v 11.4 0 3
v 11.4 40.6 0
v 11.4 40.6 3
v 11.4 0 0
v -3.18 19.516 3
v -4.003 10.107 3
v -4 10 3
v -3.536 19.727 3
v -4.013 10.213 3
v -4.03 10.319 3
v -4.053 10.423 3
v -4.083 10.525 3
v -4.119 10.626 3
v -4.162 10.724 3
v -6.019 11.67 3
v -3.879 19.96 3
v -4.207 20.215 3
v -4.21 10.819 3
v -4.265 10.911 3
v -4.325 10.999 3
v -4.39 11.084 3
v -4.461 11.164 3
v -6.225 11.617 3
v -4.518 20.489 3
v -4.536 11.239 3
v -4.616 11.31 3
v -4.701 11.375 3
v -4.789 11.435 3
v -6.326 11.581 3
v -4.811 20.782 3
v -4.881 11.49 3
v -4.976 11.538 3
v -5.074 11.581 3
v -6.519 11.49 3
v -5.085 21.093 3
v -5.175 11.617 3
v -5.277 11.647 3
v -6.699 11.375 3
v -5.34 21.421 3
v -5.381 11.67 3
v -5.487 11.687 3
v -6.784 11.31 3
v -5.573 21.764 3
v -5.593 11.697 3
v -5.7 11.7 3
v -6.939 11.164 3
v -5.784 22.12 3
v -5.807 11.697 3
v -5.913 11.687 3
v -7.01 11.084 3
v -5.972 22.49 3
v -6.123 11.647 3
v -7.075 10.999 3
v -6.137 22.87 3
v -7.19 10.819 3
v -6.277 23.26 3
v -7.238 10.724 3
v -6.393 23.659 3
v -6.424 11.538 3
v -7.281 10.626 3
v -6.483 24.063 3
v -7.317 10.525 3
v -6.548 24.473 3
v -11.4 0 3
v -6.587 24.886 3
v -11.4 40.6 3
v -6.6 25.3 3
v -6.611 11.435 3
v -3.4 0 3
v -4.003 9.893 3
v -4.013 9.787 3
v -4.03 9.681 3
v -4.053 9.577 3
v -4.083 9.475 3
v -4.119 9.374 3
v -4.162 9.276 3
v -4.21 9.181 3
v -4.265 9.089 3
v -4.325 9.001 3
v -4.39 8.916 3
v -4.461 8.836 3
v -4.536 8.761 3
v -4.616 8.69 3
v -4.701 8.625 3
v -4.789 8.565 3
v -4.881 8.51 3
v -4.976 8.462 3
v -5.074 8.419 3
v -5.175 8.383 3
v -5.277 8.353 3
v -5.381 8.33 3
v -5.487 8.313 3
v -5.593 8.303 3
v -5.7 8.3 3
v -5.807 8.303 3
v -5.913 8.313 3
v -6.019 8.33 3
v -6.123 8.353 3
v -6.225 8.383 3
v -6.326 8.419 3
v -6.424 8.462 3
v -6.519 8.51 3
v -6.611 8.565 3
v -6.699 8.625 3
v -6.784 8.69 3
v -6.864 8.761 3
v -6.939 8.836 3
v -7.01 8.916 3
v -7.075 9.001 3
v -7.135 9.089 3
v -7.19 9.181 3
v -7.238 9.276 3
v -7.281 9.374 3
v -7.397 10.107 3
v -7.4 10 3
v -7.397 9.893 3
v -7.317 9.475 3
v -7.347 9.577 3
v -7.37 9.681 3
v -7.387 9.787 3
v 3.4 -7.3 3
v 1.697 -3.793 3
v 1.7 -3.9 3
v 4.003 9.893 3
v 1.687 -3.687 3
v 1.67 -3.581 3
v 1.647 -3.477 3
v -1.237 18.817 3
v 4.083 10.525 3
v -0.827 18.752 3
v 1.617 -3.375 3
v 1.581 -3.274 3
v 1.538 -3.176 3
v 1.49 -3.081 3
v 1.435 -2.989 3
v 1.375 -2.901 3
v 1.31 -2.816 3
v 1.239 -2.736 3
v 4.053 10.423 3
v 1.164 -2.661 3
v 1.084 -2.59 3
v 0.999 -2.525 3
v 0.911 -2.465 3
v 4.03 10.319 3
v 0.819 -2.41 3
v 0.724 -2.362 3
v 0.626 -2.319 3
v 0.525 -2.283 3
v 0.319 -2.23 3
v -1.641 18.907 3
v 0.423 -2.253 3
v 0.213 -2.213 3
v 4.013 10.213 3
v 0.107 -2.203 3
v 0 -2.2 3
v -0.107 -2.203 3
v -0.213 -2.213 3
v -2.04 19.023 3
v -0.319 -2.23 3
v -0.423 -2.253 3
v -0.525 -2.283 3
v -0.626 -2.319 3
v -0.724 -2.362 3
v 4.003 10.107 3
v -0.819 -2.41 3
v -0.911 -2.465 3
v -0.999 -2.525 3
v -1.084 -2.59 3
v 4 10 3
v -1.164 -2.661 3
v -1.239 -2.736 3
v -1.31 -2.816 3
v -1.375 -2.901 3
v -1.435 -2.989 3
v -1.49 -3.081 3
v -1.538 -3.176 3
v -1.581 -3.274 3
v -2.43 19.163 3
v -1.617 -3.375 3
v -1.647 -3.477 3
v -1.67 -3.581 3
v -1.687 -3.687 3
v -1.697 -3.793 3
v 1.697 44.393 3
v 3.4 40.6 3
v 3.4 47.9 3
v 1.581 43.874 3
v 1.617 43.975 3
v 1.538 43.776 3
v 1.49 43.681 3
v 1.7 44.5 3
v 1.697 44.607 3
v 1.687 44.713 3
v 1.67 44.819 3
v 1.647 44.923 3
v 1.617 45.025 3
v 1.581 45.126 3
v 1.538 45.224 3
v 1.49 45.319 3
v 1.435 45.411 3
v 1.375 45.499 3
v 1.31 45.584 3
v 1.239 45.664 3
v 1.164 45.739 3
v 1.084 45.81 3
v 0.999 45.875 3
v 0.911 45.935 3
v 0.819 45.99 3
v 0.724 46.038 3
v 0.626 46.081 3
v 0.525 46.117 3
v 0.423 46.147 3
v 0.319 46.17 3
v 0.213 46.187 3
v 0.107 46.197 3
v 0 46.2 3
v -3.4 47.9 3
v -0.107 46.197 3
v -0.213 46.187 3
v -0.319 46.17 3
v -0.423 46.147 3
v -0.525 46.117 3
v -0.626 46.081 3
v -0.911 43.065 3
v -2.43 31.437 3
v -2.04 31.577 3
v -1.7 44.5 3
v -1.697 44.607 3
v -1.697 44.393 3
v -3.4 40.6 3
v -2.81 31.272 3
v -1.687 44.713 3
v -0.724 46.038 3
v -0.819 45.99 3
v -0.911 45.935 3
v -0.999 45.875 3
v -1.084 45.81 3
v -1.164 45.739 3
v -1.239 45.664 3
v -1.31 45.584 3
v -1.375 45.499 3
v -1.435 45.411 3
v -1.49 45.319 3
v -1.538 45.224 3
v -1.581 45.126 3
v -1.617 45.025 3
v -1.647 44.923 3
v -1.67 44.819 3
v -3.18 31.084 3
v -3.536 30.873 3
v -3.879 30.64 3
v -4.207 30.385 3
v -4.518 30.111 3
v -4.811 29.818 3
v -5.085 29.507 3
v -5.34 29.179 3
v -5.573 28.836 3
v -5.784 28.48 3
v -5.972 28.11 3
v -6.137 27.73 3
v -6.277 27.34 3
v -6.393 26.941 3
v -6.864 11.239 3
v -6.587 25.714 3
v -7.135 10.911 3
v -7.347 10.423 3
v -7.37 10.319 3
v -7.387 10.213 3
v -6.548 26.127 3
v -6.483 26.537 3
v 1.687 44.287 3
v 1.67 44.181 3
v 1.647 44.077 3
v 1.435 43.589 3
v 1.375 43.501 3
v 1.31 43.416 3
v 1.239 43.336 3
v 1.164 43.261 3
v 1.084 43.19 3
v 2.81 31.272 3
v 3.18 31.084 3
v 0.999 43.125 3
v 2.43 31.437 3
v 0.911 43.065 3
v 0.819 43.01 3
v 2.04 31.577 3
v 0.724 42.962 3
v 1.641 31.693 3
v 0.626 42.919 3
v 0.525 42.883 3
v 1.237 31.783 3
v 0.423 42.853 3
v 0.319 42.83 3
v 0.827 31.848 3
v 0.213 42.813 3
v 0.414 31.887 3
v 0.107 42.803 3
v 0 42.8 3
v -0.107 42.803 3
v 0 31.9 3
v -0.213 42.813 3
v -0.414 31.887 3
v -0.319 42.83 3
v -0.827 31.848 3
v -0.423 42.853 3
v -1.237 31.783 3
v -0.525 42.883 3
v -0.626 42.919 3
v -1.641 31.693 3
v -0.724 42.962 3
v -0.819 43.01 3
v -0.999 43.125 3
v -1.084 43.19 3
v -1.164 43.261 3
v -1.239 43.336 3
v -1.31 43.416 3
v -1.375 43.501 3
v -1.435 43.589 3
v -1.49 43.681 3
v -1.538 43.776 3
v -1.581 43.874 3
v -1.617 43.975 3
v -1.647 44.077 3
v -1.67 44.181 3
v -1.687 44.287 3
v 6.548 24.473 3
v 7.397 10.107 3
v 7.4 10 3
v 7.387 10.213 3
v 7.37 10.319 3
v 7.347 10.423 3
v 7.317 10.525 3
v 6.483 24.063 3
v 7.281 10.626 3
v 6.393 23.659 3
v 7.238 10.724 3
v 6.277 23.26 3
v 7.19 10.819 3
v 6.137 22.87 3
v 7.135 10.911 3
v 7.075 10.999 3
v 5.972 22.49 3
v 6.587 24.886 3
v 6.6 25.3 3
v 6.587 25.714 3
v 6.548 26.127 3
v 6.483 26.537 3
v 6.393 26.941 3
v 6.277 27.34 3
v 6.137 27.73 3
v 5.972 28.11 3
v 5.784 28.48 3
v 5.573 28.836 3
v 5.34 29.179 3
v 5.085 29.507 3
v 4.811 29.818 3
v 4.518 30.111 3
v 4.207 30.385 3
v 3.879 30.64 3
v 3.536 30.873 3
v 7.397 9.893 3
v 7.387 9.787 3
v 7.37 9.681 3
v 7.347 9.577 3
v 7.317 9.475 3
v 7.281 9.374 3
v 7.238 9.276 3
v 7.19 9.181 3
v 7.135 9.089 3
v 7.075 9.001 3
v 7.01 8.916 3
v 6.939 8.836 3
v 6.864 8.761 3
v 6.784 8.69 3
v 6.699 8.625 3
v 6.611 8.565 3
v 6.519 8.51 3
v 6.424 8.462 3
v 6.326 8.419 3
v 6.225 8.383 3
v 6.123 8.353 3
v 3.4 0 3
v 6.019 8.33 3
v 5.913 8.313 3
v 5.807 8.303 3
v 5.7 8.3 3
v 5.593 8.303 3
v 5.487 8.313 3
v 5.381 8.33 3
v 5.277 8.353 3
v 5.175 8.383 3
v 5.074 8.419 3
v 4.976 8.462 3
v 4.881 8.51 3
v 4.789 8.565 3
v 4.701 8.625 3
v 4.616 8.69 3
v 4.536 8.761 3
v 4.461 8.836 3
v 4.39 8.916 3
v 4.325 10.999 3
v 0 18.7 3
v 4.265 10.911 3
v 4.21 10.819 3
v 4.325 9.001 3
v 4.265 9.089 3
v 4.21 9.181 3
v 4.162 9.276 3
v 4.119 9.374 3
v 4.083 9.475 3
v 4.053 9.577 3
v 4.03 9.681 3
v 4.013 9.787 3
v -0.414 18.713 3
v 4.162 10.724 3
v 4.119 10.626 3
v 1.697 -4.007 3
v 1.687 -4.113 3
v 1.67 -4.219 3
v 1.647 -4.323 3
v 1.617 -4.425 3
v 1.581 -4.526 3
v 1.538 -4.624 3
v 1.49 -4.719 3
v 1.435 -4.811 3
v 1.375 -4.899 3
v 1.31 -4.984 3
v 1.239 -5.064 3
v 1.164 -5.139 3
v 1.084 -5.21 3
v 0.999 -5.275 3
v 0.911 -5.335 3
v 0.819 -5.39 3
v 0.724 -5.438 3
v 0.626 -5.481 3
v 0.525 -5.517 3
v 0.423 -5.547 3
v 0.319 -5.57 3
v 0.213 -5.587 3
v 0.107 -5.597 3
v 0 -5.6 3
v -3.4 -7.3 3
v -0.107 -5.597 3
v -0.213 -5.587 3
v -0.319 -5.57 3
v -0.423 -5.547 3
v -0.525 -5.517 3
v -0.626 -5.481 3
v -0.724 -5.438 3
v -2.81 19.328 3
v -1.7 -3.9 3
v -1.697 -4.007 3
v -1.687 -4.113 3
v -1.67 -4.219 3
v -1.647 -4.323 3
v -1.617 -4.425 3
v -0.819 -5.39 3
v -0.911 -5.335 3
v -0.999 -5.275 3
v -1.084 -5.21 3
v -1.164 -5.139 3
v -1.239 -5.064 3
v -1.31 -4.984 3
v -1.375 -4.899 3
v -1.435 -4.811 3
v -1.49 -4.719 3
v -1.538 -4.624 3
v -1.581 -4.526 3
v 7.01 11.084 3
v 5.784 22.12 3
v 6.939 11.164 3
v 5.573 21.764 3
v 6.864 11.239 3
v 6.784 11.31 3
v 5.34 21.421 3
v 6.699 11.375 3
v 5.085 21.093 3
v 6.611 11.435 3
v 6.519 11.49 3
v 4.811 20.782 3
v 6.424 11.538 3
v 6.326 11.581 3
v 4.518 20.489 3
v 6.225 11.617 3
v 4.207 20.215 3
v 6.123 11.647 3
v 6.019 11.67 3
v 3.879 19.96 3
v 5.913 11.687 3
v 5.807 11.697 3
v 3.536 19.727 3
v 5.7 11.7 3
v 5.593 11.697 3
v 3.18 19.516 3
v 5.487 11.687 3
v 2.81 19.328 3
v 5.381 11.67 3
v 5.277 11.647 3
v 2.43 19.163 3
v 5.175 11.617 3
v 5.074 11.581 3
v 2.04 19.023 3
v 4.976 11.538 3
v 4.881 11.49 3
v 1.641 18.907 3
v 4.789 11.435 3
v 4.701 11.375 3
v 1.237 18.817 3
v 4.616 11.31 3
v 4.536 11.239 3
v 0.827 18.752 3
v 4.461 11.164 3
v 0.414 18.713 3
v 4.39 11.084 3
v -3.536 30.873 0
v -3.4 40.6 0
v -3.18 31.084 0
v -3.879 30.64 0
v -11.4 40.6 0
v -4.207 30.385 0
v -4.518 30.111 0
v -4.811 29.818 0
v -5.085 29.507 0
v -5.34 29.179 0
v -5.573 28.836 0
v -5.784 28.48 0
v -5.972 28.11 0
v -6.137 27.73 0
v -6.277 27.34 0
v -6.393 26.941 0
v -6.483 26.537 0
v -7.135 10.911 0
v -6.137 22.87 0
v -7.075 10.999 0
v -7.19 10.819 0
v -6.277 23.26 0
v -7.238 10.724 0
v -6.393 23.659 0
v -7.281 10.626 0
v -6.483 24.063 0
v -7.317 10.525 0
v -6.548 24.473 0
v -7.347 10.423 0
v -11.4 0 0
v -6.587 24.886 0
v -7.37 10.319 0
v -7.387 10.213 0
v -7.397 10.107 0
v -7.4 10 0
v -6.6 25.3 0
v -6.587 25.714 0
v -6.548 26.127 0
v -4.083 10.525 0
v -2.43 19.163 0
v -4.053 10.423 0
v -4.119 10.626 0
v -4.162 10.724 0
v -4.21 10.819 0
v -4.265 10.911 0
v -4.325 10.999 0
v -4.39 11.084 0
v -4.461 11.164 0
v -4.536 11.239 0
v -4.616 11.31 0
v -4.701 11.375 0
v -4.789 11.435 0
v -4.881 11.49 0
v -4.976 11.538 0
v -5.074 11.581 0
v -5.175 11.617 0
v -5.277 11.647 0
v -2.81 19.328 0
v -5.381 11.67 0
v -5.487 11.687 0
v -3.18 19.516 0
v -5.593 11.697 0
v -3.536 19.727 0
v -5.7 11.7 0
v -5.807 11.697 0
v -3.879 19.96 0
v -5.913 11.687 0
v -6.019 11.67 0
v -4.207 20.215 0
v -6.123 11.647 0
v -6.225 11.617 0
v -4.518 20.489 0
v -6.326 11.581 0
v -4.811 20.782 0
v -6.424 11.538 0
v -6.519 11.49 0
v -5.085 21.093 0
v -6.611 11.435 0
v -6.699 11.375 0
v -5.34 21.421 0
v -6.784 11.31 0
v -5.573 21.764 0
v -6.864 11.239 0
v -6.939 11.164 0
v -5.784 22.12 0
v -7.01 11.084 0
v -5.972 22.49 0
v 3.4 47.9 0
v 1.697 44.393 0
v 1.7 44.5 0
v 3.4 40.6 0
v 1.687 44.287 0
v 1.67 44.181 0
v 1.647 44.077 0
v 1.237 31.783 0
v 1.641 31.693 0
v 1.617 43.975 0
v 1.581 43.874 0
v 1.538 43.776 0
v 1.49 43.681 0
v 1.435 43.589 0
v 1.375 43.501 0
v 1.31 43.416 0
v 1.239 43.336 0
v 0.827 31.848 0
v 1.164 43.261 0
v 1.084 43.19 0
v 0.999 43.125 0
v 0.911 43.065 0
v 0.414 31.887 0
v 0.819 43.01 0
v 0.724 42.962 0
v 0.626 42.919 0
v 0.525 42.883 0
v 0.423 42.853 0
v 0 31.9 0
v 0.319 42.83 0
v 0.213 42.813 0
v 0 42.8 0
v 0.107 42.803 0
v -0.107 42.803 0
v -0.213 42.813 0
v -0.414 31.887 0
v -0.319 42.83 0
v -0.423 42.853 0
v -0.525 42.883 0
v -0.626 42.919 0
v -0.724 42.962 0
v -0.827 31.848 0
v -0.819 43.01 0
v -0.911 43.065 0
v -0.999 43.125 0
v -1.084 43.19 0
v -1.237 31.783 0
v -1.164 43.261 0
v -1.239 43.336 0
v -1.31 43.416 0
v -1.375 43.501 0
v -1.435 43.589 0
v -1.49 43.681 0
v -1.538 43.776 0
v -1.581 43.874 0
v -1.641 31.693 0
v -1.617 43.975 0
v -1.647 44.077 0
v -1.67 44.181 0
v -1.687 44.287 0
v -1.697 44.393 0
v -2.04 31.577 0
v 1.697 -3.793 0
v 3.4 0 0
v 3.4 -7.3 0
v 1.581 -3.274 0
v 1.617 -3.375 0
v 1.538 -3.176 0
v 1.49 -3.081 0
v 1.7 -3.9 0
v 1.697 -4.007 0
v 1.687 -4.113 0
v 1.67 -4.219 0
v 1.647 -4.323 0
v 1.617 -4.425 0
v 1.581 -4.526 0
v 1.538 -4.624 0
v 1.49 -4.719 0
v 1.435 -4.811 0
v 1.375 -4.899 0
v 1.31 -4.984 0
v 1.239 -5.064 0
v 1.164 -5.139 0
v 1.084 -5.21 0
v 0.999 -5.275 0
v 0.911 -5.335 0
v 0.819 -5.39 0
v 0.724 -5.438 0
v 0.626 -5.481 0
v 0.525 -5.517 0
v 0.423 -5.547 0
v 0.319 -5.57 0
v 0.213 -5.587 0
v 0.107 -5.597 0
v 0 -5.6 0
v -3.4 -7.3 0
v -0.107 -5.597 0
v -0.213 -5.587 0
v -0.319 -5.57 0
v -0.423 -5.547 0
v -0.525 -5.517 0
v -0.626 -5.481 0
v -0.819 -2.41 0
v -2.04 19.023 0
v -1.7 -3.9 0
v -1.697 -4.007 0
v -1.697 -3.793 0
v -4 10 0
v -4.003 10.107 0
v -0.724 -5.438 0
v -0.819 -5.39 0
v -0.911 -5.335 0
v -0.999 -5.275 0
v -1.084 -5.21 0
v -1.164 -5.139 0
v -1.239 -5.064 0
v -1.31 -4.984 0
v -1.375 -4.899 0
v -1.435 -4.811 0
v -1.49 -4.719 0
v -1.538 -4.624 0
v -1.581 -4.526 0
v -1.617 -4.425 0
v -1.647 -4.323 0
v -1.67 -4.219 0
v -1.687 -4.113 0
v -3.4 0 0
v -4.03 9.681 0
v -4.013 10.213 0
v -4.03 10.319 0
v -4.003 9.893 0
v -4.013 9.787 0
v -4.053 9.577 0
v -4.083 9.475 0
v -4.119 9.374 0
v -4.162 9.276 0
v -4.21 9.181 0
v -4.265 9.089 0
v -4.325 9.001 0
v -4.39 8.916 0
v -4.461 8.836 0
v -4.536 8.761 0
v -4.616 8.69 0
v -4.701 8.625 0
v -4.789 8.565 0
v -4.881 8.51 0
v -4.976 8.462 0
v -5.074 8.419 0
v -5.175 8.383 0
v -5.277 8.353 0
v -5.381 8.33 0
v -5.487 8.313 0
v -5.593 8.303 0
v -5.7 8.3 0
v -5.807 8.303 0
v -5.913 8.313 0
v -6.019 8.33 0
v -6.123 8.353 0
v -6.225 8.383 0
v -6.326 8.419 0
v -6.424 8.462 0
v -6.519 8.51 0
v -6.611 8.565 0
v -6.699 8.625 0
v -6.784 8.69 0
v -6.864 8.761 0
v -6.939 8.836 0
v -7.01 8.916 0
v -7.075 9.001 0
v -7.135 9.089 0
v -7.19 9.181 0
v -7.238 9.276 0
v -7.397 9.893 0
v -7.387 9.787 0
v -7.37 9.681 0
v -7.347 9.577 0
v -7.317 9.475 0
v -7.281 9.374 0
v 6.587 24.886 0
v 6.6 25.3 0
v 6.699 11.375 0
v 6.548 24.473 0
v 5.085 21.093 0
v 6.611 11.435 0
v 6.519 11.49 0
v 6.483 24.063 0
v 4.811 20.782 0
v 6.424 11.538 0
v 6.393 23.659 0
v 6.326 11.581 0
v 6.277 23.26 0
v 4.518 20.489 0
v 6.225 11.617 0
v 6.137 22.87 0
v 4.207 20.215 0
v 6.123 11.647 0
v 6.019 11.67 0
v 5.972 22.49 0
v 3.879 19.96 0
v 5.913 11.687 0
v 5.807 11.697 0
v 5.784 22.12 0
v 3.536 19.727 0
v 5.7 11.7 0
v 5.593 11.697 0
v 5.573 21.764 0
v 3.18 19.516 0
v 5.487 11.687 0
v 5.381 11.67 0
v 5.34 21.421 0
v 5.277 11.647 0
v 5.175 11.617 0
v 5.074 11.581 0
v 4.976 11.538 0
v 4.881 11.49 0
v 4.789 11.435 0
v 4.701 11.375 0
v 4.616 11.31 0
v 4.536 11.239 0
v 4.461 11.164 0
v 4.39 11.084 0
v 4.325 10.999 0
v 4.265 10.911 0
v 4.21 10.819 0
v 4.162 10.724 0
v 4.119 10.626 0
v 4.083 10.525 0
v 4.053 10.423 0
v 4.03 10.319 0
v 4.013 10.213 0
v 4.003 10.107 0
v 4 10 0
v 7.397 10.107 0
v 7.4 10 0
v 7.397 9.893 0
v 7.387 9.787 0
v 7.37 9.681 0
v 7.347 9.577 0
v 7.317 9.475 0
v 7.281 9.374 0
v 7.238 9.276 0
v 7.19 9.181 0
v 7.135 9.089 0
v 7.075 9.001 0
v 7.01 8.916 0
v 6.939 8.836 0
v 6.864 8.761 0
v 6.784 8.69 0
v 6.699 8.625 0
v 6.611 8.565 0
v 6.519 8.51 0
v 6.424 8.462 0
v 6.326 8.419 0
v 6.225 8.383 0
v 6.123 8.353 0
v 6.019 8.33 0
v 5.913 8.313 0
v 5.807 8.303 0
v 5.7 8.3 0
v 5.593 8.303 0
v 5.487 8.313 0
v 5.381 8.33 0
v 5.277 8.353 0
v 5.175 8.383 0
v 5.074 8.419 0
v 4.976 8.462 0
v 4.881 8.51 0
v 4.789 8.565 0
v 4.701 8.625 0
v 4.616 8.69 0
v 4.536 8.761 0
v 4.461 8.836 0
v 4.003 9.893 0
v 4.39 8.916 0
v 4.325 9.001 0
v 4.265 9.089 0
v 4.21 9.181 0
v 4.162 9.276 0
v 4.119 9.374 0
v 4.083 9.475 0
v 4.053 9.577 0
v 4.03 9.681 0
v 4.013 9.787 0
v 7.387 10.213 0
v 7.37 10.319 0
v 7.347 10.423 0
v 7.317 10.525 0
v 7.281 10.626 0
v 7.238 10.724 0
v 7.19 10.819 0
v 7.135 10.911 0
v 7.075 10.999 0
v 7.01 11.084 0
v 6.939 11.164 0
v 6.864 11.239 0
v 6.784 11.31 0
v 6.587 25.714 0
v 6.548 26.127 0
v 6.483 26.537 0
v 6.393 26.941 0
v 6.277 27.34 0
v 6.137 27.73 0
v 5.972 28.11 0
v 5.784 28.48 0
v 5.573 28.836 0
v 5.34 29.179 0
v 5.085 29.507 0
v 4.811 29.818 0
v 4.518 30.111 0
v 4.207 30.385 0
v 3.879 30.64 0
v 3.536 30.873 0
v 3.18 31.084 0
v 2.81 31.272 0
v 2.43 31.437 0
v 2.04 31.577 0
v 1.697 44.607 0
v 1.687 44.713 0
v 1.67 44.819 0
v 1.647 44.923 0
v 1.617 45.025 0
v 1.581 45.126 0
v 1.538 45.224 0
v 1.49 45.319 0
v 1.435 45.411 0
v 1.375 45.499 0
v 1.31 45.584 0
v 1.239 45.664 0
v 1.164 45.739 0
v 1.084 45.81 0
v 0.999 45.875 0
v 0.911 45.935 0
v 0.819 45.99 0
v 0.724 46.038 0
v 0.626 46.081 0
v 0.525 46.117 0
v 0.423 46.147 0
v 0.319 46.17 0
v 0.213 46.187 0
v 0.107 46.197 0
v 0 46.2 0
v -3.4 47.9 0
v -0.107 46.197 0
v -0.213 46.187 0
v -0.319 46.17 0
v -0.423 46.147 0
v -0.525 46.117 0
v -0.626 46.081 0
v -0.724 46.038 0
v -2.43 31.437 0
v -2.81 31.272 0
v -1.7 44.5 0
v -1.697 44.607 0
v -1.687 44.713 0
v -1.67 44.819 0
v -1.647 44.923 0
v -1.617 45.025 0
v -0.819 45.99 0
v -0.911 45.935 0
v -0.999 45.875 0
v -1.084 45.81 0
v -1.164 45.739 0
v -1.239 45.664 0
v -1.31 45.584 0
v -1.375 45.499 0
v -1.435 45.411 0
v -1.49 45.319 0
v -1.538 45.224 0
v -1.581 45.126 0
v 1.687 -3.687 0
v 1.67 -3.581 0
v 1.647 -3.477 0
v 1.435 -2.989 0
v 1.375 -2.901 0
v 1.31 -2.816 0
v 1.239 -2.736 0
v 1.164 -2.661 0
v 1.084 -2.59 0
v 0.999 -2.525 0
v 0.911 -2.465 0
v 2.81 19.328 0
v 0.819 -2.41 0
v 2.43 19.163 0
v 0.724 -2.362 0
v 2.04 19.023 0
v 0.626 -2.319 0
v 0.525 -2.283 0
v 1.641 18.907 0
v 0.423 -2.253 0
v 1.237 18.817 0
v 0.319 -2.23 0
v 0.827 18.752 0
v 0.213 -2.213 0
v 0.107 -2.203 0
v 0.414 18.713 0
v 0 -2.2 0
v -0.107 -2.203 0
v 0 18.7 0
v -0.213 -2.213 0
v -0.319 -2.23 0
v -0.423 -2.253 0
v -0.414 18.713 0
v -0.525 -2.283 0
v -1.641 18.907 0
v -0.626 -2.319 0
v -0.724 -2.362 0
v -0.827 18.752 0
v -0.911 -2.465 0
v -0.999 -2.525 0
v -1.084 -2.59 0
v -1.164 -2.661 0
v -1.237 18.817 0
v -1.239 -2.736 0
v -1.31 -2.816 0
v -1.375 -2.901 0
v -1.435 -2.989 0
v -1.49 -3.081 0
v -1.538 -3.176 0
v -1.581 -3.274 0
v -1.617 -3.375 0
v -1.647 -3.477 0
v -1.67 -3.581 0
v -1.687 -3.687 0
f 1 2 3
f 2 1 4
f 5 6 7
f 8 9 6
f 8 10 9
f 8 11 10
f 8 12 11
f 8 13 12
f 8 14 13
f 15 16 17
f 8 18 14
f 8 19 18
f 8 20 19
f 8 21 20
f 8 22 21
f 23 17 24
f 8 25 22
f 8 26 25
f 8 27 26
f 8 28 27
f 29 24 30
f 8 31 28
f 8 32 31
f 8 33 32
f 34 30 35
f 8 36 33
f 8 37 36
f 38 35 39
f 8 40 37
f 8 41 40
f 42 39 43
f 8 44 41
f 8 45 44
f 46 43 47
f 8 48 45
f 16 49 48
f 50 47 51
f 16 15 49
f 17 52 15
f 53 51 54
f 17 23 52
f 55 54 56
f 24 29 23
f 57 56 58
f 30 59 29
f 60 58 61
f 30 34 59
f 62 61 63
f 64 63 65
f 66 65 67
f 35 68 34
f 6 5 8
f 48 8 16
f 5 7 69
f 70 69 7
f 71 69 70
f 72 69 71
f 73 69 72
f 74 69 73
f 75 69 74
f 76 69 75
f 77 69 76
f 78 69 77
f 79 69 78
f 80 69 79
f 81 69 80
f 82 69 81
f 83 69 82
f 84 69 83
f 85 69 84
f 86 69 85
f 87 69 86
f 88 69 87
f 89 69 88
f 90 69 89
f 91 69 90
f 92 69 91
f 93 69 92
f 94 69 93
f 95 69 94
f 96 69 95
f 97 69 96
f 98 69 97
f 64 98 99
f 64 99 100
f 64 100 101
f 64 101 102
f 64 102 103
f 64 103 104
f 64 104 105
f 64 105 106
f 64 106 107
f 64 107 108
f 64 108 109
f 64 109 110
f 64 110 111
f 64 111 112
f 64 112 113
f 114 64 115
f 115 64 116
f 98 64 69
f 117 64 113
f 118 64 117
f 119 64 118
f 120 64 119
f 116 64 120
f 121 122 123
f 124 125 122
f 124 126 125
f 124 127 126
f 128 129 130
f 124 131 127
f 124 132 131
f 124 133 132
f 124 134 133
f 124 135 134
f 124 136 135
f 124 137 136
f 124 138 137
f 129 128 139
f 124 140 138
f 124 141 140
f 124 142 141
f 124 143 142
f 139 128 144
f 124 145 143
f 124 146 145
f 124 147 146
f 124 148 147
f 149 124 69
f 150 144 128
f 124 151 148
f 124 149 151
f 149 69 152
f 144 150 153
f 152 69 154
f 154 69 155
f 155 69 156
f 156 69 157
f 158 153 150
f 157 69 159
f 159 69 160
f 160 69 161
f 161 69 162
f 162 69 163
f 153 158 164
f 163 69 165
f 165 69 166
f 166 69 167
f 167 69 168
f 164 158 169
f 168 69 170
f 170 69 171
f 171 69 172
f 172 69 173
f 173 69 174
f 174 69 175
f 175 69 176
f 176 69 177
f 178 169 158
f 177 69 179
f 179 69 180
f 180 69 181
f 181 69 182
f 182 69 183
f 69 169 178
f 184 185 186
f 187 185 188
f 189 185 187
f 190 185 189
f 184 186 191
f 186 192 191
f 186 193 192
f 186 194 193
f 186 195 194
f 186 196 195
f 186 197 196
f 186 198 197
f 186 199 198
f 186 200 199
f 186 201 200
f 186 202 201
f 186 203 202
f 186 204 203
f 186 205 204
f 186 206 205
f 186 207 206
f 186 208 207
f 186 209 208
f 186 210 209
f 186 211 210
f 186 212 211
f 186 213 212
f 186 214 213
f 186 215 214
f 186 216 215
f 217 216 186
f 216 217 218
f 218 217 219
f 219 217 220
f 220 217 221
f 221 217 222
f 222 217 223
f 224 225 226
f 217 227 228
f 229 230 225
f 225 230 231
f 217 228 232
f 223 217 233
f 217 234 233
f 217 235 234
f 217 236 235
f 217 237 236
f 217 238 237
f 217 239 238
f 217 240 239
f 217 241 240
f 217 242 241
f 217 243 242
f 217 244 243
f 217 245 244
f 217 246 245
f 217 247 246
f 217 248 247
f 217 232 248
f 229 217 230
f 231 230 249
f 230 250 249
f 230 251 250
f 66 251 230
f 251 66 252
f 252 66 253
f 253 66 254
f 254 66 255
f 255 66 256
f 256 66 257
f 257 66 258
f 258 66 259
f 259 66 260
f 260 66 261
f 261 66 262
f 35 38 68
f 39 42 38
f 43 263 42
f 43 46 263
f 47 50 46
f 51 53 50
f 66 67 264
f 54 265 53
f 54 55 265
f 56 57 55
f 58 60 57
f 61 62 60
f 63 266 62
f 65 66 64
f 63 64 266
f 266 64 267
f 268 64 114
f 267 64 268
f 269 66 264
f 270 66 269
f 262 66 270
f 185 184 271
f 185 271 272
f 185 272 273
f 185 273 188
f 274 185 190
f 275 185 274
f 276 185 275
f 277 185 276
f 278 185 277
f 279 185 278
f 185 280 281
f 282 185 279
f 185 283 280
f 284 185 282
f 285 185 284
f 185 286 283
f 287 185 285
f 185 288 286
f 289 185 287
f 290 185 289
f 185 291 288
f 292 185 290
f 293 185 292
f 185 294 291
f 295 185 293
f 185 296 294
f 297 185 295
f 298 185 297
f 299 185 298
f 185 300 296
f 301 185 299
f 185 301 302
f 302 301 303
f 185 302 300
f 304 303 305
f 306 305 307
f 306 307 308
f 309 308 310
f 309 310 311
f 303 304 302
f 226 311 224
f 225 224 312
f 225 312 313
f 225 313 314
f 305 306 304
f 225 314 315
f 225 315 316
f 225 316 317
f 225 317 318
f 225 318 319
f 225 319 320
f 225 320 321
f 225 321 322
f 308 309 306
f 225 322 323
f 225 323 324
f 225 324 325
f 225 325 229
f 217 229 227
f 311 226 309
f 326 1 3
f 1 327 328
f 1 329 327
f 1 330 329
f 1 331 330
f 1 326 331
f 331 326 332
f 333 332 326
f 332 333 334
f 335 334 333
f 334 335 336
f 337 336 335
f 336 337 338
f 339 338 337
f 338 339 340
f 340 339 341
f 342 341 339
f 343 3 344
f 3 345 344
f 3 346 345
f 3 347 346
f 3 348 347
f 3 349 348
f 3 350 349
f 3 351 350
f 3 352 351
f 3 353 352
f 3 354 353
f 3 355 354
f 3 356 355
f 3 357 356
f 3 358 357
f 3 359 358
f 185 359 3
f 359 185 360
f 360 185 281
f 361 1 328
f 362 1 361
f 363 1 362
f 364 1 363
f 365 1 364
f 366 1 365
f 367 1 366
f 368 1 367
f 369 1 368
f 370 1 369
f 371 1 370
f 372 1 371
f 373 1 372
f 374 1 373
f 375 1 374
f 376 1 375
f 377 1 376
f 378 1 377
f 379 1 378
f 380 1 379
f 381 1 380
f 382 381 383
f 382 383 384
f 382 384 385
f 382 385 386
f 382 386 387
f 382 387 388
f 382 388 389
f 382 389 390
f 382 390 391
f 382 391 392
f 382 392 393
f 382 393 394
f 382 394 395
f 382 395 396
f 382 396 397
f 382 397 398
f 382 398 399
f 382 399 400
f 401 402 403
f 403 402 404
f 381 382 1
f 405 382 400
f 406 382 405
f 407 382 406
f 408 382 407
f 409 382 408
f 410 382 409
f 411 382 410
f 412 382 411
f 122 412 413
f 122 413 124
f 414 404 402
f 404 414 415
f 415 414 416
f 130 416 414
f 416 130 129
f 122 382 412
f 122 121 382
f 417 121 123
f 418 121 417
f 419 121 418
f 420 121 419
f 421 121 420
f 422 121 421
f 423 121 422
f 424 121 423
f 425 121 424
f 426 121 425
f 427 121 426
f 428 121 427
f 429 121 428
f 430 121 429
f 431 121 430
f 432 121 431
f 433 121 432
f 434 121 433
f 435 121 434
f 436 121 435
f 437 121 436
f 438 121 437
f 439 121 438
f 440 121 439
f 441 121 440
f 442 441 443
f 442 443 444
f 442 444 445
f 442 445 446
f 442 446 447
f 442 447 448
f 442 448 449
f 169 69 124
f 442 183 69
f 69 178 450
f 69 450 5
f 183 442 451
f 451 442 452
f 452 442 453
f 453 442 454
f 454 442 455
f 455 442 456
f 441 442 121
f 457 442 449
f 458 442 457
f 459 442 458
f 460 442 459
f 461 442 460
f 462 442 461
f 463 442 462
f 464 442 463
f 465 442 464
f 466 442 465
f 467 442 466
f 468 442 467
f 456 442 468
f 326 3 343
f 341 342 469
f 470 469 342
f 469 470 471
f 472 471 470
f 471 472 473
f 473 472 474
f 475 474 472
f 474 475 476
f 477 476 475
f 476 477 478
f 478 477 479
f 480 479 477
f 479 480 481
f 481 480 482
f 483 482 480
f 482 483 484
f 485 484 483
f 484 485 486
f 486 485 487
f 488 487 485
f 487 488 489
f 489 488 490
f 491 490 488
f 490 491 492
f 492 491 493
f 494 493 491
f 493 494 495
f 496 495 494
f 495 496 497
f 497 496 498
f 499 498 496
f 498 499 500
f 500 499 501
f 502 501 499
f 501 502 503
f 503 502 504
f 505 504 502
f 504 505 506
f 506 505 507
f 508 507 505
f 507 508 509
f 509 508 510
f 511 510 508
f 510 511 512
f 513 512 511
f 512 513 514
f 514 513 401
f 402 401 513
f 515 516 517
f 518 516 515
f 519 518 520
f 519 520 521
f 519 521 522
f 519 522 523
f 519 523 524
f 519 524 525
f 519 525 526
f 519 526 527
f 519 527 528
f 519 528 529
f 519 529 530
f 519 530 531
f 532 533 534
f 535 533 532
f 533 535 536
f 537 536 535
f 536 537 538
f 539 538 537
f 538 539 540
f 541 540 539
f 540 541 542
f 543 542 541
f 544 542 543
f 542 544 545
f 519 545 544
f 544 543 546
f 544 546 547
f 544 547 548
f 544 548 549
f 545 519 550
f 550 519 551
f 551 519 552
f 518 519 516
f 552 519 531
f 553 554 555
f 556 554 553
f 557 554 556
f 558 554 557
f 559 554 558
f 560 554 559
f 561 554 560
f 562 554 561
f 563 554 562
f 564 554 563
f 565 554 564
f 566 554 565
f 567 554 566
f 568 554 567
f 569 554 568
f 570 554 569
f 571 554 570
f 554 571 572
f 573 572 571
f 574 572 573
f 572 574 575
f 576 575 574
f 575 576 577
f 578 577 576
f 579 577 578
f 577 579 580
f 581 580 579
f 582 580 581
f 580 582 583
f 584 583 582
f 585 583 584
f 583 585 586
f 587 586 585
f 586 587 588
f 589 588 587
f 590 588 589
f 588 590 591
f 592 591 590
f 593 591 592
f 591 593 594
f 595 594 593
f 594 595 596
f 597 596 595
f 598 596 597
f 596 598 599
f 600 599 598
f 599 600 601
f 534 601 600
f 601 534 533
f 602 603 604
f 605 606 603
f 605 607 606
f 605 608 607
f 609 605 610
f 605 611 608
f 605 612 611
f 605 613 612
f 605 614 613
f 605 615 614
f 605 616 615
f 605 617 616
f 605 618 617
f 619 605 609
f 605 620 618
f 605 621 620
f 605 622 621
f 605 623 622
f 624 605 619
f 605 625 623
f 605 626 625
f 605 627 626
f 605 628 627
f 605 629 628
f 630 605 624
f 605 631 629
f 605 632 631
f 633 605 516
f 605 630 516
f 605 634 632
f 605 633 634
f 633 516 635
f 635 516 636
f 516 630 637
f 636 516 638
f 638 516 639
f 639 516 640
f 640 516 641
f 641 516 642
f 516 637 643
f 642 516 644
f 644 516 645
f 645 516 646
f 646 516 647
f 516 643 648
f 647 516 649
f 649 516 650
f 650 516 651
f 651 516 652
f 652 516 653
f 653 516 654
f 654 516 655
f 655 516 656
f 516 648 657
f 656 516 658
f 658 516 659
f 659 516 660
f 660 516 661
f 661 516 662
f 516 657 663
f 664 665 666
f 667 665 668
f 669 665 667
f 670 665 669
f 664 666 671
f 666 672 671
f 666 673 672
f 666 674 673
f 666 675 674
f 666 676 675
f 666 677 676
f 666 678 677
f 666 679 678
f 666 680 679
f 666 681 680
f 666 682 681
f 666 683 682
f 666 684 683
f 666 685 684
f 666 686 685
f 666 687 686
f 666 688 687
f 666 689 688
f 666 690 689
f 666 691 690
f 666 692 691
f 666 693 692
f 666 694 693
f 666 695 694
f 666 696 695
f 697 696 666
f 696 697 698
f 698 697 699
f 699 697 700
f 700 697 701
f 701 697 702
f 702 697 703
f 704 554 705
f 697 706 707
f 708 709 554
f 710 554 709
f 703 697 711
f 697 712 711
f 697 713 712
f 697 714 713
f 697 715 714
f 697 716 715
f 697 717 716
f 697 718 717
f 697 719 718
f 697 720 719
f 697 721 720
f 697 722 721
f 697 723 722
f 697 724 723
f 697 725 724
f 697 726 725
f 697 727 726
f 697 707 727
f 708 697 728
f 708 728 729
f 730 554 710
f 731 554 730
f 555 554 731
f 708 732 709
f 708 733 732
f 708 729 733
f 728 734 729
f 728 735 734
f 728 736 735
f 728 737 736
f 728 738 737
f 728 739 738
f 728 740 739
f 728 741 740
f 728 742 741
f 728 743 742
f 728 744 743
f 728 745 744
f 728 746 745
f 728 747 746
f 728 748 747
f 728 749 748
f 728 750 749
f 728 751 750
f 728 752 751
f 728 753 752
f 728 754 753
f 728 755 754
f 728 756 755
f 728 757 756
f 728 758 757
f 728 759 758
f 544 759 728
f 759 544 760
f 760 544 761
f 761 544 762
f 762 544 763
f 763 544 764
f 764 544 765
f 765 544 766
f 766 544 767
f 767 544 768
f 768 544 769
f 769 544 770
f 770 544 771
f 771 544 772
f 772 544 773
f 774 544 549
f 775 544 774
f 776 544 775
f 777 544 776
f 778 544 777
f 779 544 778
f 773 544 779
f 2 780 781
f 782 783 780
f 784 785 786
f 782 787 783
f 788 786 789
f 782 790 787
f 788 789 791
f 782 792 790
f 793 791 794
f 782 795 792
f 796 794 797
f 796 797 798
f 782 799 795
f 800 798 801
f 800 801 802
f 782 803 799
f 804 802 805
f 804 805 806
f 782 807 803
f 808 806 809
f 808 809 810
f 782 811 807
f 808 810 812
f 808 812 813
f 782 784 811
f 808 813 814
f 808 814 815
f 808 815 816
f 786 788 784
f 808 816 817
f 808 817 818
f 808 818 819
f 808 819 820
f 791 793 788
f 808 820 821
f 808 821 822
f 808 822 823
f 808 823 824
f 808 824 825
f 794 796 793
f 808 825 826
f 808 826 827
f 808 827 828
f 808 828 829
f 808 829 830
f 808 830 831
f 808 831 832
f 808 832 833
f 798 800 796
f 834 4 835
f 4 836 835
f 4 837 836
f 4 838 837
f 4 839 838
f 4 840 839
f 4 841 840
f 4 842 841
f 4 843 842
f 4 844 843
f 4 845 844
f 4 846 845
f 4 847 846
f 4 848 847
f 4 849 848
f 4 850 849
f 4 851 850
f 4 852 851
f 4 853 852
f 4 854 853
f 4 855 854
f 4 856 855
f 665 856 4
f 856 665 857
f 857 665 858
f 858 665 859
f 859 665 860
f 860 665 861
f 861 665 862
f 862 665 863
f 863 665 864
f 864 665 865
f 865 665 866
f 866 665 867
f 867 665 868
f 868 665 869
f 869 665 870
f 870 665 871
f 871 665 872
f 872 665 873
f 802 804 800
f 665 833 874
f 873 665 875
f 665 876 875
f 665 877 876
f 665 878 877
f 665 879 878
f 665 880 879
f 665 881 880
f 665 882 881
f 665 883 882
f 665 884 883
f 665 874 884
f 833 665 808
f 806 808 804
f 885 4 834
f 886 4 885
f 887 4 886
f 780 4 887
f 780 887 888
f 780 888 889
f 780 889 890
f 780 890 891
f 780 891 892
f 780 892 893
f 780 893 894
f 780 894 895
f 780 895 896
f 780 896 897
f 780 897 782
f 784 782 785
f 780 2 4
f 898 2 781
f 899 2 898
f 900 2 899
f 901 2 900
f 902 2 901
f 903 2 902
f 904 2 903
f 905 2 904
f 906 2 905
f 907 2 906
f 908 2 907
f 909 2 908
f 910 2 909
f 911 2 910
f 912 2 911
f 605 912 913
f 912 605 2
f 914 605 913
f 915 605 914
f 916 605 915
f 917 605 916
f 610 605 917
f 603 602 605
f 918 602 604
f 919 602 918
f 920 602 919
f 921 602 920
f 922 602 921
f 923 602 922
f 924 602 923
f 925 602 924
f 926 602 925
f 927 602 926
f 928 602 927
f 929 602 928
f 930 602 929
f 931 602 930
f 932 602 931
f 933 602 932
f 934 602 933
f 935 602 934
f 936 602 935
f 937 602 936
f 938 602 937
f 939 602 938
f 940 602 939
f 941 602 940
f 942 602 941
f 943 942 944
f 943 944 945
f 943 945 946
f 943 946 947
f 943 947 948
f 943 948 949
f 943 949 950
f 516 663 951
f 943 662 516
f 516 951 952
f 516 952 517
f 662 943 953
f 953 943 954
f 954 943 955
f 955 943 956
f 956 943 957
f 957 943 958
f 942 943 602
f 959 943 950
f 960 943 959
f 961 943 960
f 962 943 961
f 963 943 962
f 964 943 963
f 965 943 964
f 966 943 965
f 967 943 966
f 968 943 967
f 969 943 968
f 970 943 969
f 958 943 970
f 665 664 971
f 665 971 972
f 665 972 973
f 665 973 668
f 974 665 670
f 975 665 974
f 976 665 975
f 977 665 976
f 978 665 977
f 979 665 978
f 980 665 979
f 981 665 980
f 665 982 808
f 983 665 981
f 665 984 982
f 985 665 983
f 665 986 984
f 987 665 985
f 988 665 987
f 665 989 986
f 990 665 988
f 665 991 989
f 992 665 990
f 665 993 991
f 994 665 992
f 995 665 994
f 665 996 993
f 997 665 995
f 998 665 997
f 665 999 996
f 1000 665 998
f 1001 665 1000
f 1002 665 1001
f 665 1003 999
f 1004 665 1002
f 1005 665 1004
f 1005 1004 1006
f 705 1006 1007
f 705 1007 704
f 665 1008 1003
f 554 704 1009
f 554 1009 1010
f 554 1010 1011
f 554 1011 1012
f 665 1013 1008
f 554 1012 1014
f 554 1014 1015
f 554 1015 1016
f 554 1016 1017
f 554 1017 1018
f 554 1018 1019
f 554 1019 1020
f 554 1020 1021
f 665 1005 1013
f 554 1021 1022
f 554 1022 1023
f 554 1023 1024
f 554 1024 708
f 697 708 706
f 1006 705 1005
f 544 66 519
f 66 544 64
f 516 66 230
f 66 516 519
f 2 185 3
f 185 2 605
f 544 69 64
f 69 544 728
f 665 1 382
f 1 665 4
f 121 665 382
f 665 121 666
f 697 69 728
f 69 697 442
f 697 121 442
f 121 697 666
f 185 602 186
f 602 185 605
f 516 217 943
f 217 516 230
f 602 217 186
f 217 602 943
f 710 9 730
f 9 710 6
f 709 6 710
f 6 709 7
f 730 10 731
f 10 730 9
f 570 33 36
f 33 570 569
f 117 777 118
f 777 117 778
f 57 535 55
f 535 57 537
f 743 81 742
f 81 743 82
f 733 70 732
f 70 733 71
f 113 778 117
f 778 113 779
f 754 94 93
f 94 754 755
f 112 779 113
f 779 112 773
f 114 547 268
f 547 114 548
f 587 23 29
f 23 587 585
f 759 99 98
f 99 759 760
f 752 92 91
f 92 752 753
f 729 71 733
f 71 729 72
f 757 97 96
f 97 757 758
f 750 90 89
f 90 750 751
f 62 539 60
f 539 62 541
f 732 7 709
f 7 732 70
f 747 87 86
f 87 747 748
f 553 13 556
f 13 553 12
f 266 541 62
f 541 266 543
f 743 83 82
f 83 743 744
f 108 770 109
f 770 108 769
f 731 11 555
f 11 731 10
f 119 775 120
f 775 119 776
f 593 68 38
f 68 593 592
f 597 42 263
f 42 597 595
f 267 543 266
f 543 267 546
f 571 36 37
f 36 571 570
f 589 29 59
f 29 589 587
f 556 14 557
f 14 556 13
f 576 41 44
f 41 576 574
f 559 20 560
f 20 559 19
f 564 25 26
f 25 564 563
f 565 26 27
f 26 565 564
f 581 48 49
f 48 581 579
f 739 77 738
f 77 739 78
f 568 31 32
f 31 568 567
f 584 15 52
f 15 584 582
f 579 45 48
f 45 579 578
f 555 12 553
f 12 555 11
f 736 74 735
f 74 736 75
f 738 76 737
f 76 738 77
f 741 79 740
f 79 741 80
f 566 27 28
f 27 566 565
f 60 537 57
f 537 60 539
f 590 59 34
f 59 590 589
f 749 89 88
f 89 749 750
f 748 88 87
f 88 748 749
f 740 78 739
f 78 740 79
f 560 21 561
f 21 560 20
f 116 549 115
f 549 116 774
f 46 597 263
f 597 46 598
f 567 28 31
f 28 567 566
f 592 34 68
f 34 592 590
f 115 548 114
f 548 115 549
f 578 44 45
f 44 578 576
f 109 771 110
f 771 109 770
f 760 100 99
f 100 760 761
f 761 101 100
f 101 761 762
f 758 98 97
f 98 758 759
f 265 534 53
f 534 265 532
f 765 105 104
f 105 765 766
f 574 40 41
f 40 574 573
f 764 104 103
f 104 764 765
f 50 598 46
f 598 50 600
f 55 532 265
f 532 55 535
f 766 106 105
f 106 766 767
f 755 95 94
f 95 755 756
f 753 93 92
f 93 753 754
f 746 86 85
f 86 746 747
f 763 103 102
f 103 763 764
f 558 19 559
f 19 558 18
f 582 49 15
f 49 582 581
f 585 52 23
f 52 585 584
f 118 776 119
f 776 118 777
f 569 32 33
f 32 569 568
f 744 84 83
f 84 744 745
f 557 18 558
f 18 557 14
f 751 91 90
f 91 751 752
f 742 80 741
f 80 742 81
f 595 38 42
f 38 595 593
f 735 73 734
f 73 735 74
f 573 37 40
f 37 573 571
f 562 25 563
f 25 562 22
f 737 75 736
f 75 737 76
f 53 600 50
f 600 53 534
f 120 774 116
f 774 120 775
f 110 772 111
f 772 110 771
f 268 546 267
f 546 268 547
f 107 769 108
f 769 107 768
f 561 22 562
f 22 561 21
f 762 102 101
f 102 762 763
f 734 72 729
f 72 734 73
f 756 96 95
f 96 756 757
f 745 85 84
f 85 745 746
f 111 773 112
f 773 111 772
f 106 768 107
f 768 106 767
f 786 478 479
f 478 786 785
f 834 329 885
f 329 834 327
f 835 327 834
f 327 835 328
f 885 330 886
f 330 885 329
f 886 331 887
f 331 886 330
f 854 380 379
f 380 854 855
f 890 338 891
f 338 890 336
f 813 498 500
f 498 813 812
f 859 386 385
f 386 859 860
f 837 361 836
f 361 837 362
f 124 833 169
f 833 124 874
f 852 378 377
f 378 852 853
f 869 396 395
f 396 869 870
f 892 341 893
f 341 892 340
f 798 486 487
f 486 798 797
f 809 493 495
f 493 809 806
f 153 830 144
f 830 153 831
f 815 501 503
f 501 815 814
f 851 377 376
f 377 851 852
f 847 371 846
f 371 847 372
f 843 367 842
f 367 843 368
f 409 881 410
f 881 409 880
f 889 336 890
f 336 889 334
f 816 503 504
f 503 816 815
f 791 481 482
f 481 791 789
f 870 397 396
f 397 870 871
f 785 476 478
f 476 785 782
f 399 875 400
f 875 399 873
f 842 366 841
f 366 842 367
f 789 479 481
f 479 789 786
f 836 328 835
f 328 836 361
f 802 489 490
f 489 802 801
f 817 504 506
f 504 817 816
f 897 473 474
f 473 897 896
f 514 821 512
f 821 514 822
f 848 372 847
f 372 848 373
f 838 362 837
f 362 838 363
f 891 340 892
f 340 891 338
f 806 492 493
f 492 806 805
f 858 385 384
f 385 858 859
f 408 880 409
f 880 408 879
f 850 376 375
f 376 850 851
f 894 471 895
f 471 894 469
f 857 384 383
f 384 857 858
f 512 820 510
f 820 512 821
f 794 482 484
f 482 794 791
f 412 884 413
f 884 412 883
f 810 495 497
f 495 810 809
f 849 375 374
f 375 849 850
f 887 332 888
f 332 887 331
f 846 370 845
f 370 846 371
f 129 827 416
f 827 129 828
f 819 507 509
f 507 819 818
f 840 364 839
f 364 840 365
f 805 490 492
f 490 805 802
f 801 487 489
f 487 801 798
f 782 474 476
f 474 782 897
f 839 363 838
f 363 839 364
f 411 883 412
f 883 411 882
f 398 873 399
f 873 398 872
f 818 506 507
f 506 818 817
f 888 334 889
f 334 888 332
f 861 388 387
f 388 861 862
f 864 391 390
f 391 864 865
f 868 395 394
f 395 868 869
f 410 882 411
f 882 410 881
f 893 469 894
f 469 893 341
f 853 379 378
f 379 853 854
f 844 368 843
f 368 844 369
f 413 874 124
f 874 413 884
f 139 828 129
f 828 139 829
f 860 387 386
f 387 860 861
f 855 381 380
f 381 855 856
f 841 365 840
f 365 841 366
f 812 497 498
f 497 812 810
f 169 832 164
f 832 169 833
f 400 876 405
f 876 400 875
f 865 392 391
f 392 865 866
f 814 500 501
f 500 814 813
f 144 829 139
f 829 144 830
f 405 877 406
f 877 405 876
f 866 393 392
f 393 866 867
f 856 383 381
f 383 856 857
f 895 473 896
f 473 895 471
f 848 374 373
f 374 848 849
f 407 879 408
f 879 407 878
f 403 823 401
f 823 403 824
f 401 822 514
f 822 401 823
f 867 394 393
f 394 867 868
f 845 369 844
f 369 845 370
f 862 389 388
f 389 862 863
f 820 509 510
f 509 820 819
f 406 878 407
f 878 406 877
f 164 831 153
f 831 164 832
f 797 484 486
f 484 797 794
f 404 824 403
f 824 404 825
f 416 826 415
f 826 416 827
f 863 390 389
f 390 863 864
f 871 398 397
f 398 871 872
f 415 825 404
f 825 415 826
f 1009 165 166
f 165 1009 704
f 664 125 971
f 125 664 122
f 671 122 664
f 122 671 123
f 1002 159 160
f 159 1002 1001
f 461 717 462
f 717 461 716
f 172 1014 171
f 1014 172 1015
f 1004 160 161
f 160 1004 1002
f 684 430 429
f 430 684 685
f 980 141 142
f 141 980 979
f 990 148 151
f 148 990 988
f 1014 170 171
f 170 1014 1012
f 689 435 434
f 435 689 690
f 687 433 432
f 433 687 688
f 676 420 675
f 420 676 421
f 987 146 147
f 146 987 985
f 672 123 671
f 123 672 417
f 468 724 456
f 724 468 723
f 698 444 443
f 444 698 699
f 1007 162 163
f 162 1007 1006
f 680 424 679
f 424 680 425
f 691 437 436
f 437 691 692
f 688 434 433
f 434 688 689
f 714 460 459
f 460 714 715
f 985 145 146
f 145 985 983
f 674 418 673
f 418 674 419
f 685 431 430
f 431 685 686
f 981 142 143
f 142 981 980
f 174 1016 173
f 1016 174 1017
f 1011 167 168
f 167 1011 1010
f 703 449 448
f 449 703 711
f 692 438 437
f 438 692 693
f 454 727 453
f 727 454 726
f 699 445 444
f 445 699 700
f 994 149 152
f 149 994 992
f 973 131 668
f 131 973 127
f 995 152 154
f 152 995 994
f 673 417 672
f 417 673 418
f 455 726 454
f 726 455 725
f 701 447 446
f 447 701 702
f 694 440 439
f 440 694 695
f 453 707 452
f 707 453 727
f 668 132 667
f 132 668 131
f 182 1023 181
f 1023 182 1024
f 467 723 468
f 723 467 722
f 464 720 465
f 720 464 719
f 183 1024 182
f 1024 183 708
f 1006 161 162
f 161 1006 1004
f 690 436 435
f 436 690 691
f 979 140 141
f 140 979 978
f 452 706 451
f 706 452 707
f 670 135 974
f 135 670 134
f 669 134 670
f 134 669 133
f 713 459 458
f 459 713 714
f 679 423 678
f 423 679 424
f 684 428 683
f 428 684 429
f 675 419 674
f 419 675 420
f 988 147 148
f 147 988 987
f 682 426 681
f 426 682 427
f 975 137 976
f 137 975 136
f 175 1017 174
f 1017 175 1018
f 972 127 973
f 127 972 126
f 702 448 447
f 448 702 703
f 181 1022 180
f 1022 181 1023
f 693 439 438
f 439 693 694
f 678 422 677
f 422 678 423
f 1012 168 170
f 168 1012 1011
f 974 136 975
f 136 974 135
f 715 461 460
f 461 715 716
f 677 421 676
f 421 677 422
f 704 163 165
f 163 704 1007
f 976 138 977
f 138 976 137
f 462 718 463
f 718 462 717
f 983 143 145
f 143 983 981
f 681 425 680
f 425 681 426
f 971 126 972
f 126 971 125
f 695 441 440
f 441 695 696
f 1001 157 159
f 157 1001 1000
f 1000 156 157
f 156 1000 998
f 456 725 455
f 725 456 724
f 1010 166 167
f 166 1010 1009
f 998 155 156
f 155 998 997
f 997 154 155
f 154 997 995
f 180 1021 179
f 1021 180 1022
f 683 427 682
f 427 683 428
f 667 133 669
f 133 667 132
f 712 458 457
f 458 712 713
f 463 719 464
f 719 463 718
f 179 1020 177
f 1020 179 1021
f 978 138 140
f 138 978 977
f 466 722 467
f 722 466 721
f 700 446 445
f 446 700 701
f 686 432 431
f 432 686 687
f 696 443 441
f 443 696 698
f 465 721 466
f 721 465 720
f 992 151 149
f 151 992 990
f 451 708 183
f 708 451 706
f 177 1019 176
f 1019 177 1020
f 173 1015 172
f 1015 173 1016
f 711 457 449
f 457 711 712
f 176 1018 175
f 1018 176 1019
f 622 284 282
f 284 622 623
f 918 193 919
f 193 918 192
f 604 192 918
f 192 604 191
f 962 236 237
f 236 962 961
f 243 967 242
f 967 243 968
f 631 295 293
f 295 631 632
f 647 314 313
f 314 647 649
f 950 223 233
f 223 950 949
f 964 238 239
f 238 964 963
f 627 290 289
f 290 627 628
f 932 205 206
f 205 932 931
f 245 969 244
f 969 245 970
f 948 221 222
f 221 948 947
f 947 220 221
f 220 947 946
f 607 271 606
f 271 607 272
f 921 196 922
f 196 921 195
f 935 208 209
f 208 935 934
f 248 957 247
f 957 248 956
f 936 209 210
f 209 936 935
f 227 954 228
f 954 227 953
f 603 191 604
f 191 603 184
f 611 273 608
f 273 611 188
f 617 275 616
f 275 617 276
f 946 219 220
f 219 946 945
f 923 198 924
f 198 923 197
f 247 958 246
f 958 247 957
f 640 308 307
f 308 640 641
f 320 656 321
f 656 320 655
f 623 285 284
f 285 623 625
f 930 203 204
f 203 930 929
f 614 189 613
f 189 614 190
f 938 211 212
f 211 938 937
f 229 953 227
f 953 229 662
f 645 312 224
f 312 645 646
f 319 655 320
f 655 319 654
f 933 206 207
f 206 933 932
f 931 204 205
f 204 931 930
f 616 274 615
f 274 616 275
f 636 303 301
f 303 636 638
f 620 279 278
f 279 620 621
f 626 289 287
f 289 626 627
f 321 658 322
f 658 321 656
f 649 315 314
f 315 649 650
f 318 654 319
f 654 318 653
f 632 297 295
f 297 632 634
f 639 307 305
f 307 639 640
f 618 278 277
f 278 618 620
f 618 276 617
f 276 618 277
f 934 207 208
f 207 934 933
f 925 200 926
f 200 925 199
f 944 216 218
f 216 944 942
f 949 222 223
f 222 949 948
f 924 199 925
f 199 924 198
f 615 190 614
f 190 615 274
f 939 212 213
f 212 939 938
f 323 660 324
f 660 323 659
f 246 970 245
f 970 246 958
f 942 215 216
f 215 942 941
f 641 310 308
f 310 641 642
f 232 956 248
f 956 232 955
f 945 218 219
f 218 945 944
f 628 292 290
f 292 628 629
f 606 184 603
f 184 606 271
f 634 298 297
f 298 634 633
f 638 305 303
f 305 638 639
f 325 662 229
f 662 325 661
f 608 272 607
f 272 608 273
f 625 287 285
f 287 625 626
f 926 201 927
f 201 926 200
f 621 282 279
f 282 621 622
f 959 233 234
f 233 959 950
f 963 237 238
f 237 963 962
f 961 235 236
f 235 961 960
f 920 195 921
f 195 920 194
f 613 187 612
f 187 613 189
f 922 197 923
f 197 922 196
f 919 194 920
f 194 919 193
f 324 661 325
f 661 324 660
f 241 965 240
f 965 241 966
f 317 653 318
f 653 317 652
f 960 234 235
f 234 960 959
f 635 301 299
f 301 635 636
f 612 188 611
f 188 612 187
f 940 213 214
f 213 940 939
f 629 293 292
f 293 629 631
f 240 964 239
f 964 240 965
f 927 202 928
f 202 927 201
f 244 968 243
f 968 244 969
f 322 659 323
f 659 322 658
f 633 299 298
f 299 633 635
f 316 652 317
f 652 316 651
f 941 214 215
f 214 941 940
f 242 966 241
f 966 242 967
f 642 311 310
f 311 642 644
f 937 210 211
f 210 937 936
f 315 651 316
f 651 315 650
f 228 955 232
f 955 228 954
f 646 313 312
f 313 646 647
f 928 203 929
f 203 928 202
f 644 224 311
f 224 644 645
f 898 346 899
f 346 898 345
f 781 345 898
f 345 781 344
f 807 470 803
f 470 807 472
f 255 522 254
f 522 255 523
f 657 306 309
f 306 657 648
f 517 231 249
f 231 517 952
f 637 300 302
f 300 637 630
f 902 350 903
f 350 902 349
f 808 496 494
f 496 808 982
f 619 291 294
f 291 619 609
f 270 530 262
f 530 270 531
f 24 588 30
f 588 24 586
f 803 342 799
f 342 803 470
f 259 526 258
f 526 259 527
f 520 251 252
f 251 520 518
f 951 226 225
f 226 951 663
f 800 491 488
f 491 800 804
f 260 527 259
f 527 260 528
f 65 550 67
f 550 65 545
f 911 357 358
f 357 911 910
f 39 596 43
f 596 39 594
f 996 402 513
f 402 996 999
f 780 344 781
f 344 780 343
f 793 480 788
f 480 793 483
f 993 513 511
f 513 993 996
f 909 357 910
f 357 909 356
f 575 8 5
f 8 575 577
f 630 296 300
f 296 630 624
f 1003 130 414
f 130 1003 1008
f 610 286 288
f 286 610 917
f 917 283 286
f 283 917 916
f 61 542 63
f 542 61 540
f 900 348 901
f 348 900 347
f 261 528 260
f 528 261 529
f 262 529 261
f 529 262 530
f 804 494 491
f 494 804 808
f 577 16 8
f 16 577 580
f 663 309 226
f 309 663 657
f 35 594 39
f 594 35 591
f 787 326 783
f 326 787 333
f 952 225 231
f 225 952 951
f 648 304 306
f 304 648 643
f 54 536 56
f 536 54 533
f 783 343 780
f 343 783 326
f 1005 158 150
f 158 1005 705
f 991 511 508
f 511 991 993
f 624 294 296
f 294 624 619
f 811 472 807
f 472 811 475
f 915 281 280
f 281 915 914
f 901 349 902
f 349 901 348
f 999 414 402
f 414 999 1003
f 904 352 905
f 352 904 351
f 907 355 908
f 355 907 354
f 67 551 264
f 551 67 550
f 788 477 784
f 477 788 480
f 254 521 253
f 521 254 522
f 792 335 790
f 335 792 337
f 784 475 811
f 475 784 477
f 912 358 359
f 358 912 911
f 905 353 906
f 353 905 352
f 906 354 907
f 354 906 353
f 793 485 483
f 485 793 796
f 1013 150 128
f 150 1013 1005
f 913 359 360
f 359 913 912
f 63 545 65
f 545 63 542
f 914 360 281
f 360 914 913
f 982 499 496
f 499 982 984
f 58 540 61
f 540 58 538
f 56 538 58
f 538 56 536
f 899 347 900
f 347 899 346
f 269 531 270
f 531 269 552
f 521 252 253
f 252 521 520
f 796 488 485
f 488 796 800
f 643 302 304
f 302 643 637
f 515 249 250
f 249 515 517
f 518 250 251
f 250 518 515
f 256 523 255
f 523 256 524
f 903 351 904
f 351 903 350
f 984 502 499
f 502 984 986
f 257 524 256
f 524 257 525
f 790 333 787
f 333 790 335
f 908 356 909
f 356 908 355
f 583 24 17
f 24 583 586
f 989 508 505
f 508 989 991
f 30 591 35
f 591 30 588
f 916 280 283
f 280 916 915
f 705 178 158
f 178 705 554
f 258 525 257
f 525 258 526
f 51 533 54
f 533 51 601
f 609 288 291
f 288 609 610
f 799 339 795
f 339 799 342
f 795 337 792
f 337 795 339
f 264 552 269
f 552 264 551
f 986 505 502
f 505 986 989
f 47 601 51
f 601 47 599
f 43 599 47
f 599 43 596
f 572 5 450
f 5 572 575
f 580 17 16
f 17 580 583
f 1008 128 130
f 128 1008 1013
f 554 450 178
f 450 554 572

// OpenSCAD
m3s_d = 3.4;
m3s_dh = 6;
m3s_hh = 2;

m3_nuts_width = 5.7;
m3_nuts_height = 6.4;


thickness = 3;

join_hole_distance = m3_nuts_width * 2;
border_clearance = m3_nuts_height;

width = m3_nuts_width * 4;

arm_join_height = 10;

spacing = 40.6;

support_hole_distance = 3.9;


difference() {
  
  union() {
  
    translate([-m3_nuts_width*2,0,0])
    cube([width, spacing, thickness]);

    translate([-m3s_d,-(m3s_d + support_hole_distance),0])    
    cube([m3s_d*2, m3s_d + support_hole_distance,thickness]);
    
    translate([-m3s_d,spacing,0])    
    cube([m3s_d*2, m3s_d + support_hole_distance,thickness]);
  }
  
  // Arm join holes
  union () {

    translate([-m3_nuts_width, arm_join_height, 0])     
    cylinder(d=m3s_d, h=thickness, $fn=100);

    translate([m3_nuts_width, arm_join_height, 0])
    cylinder(d=m3s_d, h=thickness, $fn=100);
    
    translate([0,-support_hole_distance,0])    
    cylinder(d=m3s_d, h=thickness, $fn=100);
    
    translate([0,support_hole_distance+spacing,0])    
    cylinder(d=m3s_d, h=thickness, $fn=100);
    
    translate([0,(spacing+arm_join_height)/2,0])    
    cylinder(d=width-border_clearance*1.5, h=thickness, $fn=100);
  }
}
